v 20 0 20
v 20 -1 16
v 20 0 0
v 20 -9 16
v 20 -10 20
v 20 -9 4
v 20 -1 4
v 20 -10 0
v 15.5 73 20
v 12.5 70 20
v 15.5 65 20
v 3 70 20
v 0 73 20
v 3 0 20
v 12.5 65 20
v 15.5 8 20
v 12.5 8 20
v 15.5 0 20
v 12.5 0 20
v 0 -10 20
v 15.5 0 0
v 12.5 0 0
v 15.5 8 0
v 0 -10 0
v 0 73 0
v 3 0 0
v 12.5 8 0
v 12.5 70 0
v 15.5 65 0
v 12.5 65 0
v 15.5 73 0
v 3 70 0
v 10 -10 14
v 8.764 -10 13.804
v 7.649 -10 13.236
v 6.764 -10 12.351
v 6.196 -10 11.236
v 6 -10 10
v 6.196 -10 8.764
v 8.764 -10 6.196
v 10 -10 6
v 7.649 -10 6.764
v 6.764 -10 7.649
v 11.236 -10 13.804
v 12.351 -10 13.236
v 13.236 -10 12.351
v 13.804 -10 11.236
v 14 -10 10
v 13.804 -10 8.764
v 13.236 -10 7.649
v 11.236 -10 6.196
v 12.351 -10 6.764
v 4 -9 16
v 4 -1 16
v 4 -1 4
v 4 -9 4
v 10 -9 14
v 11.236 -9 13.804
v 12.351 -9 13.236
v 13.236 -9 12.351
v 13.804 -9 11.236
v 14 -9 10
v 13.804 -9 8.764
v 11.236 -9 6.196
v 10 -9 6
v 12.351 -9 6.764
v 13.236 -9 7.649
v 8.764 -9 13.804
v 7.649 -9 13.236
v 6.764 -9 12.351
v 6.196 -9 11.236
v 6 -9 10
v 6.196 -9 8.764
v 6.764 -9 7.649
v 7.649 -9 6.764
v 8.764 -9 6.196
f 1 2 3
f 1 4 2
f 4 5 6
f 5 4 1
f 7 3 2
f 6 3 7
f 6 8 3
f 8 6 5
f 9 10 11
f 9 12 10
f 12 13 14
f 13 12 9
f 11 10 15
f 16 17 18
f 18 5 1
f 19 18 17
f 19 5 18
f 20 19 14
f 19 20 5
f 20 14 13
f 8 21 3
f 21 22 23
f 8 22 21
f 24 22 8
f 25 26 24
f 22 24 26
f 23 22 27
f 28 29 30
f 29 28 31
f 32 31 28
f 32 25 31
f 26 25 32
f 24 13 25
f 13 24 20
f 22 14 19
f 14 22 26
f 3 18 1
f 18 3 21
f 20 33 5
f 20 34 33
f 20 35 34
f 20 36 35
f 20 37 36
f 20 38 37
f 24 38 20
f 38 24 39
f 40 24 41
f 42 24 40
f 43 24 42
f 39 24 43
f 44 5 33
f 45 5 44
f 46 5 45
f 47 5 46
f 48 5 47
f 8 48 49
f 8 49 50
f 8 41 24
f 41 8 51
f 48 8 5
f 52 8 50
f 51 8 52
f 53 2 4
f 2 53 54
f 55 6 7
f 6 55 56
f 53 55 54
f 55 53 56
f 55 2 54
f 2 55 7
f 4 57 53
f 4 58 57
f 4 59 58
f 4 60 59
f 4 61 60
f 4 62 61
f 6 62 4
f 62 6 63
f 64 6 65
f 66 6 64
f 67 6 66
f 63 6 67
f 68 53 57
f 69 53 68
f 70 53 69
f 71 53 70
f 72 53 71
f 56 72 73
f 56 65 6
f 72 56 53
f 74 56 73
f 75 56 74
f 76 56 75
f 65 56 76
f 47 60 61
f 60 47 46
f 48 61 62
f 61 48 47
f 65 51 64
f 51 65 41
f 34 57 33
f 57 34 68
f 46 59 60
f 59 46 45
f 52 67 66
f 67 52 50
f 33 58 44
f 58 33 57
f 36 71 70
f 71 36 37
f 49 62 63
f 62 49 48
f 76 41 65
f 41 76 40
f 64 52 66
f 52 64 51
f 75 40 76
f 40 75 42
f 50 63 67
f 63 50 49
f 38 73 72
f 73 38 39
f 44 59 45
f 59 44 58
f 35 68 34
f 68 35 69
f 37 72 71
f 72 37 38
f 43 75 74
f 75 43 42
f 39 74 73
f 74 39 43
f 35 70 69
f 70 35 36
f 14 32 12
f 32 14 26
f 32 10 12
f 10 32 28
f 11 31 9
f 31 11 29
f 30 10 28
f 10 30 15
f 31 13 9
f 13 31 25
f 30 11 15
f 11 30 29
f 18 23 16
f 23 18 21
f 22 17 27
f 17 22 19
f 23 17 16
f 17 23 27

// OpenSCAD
//-------------------------------------------------------------
// Edit these two variables, according to your phone
//-------------------------------------------------------------
phone_width = 70;
phone_depth = 9.5;

//-------------------------------------------------------------

suppport_height = 20;

color([1,0,0])

// The support base is a simple longe rectangle
translate([0,0,0])
cube ([3, phone_width, suppport_height]);

// upper winglet, to hold the phone
color([0,1,0])
translate([phone_depth + 3, phone_width-5, 0])
cube ([3, 8, suppport_height]);

// lower winglet, to hold the phone
color([0,0,1])
translate([phone_depth + 3, 0, 0])
cube ([3, 8, suppport_height]);

// the piece connecting the support base to the winglet
color([1,1,0])
translate([0, phone_width, 0])
cube ([phone_depth + 3, 3, suppport_height]);

color([0,1,1])
nut_holder(10, suppport_height);

module nut_holder(box_height, box_side)
{
    //draw the nut holder:
    // This is a box rotated 90deg around X
    translate([0, -box_height, 0]) {        
        nut_width = 12; /* measured xy when nut is on a table */
        nut_height = 8; /* measured z when nut is on a table */
            
        center = (box_side - nut_width) / 2;
        
        //translate([center, -3, center])
        //cube ([nut_width, 1, nut_width]);
        
        difference() {        
            // A box for the nut holder
            cube ([box_side, box_height, box_side]);
            
            // A rectangular hole, inside the box,
            // where we can put the nut
            translate([center, 1, center])
            cube ([box_side, nut_height, nut_width]);
            
            // A hole, thorugh that box, so we can insert the screw
            rotate([90, 0, 0])
            translate([box_side / 2, box_side / 2, -2])        
            cylinder(r1=4, r2=4, h=3, $fn=20);
        }
    }
}
